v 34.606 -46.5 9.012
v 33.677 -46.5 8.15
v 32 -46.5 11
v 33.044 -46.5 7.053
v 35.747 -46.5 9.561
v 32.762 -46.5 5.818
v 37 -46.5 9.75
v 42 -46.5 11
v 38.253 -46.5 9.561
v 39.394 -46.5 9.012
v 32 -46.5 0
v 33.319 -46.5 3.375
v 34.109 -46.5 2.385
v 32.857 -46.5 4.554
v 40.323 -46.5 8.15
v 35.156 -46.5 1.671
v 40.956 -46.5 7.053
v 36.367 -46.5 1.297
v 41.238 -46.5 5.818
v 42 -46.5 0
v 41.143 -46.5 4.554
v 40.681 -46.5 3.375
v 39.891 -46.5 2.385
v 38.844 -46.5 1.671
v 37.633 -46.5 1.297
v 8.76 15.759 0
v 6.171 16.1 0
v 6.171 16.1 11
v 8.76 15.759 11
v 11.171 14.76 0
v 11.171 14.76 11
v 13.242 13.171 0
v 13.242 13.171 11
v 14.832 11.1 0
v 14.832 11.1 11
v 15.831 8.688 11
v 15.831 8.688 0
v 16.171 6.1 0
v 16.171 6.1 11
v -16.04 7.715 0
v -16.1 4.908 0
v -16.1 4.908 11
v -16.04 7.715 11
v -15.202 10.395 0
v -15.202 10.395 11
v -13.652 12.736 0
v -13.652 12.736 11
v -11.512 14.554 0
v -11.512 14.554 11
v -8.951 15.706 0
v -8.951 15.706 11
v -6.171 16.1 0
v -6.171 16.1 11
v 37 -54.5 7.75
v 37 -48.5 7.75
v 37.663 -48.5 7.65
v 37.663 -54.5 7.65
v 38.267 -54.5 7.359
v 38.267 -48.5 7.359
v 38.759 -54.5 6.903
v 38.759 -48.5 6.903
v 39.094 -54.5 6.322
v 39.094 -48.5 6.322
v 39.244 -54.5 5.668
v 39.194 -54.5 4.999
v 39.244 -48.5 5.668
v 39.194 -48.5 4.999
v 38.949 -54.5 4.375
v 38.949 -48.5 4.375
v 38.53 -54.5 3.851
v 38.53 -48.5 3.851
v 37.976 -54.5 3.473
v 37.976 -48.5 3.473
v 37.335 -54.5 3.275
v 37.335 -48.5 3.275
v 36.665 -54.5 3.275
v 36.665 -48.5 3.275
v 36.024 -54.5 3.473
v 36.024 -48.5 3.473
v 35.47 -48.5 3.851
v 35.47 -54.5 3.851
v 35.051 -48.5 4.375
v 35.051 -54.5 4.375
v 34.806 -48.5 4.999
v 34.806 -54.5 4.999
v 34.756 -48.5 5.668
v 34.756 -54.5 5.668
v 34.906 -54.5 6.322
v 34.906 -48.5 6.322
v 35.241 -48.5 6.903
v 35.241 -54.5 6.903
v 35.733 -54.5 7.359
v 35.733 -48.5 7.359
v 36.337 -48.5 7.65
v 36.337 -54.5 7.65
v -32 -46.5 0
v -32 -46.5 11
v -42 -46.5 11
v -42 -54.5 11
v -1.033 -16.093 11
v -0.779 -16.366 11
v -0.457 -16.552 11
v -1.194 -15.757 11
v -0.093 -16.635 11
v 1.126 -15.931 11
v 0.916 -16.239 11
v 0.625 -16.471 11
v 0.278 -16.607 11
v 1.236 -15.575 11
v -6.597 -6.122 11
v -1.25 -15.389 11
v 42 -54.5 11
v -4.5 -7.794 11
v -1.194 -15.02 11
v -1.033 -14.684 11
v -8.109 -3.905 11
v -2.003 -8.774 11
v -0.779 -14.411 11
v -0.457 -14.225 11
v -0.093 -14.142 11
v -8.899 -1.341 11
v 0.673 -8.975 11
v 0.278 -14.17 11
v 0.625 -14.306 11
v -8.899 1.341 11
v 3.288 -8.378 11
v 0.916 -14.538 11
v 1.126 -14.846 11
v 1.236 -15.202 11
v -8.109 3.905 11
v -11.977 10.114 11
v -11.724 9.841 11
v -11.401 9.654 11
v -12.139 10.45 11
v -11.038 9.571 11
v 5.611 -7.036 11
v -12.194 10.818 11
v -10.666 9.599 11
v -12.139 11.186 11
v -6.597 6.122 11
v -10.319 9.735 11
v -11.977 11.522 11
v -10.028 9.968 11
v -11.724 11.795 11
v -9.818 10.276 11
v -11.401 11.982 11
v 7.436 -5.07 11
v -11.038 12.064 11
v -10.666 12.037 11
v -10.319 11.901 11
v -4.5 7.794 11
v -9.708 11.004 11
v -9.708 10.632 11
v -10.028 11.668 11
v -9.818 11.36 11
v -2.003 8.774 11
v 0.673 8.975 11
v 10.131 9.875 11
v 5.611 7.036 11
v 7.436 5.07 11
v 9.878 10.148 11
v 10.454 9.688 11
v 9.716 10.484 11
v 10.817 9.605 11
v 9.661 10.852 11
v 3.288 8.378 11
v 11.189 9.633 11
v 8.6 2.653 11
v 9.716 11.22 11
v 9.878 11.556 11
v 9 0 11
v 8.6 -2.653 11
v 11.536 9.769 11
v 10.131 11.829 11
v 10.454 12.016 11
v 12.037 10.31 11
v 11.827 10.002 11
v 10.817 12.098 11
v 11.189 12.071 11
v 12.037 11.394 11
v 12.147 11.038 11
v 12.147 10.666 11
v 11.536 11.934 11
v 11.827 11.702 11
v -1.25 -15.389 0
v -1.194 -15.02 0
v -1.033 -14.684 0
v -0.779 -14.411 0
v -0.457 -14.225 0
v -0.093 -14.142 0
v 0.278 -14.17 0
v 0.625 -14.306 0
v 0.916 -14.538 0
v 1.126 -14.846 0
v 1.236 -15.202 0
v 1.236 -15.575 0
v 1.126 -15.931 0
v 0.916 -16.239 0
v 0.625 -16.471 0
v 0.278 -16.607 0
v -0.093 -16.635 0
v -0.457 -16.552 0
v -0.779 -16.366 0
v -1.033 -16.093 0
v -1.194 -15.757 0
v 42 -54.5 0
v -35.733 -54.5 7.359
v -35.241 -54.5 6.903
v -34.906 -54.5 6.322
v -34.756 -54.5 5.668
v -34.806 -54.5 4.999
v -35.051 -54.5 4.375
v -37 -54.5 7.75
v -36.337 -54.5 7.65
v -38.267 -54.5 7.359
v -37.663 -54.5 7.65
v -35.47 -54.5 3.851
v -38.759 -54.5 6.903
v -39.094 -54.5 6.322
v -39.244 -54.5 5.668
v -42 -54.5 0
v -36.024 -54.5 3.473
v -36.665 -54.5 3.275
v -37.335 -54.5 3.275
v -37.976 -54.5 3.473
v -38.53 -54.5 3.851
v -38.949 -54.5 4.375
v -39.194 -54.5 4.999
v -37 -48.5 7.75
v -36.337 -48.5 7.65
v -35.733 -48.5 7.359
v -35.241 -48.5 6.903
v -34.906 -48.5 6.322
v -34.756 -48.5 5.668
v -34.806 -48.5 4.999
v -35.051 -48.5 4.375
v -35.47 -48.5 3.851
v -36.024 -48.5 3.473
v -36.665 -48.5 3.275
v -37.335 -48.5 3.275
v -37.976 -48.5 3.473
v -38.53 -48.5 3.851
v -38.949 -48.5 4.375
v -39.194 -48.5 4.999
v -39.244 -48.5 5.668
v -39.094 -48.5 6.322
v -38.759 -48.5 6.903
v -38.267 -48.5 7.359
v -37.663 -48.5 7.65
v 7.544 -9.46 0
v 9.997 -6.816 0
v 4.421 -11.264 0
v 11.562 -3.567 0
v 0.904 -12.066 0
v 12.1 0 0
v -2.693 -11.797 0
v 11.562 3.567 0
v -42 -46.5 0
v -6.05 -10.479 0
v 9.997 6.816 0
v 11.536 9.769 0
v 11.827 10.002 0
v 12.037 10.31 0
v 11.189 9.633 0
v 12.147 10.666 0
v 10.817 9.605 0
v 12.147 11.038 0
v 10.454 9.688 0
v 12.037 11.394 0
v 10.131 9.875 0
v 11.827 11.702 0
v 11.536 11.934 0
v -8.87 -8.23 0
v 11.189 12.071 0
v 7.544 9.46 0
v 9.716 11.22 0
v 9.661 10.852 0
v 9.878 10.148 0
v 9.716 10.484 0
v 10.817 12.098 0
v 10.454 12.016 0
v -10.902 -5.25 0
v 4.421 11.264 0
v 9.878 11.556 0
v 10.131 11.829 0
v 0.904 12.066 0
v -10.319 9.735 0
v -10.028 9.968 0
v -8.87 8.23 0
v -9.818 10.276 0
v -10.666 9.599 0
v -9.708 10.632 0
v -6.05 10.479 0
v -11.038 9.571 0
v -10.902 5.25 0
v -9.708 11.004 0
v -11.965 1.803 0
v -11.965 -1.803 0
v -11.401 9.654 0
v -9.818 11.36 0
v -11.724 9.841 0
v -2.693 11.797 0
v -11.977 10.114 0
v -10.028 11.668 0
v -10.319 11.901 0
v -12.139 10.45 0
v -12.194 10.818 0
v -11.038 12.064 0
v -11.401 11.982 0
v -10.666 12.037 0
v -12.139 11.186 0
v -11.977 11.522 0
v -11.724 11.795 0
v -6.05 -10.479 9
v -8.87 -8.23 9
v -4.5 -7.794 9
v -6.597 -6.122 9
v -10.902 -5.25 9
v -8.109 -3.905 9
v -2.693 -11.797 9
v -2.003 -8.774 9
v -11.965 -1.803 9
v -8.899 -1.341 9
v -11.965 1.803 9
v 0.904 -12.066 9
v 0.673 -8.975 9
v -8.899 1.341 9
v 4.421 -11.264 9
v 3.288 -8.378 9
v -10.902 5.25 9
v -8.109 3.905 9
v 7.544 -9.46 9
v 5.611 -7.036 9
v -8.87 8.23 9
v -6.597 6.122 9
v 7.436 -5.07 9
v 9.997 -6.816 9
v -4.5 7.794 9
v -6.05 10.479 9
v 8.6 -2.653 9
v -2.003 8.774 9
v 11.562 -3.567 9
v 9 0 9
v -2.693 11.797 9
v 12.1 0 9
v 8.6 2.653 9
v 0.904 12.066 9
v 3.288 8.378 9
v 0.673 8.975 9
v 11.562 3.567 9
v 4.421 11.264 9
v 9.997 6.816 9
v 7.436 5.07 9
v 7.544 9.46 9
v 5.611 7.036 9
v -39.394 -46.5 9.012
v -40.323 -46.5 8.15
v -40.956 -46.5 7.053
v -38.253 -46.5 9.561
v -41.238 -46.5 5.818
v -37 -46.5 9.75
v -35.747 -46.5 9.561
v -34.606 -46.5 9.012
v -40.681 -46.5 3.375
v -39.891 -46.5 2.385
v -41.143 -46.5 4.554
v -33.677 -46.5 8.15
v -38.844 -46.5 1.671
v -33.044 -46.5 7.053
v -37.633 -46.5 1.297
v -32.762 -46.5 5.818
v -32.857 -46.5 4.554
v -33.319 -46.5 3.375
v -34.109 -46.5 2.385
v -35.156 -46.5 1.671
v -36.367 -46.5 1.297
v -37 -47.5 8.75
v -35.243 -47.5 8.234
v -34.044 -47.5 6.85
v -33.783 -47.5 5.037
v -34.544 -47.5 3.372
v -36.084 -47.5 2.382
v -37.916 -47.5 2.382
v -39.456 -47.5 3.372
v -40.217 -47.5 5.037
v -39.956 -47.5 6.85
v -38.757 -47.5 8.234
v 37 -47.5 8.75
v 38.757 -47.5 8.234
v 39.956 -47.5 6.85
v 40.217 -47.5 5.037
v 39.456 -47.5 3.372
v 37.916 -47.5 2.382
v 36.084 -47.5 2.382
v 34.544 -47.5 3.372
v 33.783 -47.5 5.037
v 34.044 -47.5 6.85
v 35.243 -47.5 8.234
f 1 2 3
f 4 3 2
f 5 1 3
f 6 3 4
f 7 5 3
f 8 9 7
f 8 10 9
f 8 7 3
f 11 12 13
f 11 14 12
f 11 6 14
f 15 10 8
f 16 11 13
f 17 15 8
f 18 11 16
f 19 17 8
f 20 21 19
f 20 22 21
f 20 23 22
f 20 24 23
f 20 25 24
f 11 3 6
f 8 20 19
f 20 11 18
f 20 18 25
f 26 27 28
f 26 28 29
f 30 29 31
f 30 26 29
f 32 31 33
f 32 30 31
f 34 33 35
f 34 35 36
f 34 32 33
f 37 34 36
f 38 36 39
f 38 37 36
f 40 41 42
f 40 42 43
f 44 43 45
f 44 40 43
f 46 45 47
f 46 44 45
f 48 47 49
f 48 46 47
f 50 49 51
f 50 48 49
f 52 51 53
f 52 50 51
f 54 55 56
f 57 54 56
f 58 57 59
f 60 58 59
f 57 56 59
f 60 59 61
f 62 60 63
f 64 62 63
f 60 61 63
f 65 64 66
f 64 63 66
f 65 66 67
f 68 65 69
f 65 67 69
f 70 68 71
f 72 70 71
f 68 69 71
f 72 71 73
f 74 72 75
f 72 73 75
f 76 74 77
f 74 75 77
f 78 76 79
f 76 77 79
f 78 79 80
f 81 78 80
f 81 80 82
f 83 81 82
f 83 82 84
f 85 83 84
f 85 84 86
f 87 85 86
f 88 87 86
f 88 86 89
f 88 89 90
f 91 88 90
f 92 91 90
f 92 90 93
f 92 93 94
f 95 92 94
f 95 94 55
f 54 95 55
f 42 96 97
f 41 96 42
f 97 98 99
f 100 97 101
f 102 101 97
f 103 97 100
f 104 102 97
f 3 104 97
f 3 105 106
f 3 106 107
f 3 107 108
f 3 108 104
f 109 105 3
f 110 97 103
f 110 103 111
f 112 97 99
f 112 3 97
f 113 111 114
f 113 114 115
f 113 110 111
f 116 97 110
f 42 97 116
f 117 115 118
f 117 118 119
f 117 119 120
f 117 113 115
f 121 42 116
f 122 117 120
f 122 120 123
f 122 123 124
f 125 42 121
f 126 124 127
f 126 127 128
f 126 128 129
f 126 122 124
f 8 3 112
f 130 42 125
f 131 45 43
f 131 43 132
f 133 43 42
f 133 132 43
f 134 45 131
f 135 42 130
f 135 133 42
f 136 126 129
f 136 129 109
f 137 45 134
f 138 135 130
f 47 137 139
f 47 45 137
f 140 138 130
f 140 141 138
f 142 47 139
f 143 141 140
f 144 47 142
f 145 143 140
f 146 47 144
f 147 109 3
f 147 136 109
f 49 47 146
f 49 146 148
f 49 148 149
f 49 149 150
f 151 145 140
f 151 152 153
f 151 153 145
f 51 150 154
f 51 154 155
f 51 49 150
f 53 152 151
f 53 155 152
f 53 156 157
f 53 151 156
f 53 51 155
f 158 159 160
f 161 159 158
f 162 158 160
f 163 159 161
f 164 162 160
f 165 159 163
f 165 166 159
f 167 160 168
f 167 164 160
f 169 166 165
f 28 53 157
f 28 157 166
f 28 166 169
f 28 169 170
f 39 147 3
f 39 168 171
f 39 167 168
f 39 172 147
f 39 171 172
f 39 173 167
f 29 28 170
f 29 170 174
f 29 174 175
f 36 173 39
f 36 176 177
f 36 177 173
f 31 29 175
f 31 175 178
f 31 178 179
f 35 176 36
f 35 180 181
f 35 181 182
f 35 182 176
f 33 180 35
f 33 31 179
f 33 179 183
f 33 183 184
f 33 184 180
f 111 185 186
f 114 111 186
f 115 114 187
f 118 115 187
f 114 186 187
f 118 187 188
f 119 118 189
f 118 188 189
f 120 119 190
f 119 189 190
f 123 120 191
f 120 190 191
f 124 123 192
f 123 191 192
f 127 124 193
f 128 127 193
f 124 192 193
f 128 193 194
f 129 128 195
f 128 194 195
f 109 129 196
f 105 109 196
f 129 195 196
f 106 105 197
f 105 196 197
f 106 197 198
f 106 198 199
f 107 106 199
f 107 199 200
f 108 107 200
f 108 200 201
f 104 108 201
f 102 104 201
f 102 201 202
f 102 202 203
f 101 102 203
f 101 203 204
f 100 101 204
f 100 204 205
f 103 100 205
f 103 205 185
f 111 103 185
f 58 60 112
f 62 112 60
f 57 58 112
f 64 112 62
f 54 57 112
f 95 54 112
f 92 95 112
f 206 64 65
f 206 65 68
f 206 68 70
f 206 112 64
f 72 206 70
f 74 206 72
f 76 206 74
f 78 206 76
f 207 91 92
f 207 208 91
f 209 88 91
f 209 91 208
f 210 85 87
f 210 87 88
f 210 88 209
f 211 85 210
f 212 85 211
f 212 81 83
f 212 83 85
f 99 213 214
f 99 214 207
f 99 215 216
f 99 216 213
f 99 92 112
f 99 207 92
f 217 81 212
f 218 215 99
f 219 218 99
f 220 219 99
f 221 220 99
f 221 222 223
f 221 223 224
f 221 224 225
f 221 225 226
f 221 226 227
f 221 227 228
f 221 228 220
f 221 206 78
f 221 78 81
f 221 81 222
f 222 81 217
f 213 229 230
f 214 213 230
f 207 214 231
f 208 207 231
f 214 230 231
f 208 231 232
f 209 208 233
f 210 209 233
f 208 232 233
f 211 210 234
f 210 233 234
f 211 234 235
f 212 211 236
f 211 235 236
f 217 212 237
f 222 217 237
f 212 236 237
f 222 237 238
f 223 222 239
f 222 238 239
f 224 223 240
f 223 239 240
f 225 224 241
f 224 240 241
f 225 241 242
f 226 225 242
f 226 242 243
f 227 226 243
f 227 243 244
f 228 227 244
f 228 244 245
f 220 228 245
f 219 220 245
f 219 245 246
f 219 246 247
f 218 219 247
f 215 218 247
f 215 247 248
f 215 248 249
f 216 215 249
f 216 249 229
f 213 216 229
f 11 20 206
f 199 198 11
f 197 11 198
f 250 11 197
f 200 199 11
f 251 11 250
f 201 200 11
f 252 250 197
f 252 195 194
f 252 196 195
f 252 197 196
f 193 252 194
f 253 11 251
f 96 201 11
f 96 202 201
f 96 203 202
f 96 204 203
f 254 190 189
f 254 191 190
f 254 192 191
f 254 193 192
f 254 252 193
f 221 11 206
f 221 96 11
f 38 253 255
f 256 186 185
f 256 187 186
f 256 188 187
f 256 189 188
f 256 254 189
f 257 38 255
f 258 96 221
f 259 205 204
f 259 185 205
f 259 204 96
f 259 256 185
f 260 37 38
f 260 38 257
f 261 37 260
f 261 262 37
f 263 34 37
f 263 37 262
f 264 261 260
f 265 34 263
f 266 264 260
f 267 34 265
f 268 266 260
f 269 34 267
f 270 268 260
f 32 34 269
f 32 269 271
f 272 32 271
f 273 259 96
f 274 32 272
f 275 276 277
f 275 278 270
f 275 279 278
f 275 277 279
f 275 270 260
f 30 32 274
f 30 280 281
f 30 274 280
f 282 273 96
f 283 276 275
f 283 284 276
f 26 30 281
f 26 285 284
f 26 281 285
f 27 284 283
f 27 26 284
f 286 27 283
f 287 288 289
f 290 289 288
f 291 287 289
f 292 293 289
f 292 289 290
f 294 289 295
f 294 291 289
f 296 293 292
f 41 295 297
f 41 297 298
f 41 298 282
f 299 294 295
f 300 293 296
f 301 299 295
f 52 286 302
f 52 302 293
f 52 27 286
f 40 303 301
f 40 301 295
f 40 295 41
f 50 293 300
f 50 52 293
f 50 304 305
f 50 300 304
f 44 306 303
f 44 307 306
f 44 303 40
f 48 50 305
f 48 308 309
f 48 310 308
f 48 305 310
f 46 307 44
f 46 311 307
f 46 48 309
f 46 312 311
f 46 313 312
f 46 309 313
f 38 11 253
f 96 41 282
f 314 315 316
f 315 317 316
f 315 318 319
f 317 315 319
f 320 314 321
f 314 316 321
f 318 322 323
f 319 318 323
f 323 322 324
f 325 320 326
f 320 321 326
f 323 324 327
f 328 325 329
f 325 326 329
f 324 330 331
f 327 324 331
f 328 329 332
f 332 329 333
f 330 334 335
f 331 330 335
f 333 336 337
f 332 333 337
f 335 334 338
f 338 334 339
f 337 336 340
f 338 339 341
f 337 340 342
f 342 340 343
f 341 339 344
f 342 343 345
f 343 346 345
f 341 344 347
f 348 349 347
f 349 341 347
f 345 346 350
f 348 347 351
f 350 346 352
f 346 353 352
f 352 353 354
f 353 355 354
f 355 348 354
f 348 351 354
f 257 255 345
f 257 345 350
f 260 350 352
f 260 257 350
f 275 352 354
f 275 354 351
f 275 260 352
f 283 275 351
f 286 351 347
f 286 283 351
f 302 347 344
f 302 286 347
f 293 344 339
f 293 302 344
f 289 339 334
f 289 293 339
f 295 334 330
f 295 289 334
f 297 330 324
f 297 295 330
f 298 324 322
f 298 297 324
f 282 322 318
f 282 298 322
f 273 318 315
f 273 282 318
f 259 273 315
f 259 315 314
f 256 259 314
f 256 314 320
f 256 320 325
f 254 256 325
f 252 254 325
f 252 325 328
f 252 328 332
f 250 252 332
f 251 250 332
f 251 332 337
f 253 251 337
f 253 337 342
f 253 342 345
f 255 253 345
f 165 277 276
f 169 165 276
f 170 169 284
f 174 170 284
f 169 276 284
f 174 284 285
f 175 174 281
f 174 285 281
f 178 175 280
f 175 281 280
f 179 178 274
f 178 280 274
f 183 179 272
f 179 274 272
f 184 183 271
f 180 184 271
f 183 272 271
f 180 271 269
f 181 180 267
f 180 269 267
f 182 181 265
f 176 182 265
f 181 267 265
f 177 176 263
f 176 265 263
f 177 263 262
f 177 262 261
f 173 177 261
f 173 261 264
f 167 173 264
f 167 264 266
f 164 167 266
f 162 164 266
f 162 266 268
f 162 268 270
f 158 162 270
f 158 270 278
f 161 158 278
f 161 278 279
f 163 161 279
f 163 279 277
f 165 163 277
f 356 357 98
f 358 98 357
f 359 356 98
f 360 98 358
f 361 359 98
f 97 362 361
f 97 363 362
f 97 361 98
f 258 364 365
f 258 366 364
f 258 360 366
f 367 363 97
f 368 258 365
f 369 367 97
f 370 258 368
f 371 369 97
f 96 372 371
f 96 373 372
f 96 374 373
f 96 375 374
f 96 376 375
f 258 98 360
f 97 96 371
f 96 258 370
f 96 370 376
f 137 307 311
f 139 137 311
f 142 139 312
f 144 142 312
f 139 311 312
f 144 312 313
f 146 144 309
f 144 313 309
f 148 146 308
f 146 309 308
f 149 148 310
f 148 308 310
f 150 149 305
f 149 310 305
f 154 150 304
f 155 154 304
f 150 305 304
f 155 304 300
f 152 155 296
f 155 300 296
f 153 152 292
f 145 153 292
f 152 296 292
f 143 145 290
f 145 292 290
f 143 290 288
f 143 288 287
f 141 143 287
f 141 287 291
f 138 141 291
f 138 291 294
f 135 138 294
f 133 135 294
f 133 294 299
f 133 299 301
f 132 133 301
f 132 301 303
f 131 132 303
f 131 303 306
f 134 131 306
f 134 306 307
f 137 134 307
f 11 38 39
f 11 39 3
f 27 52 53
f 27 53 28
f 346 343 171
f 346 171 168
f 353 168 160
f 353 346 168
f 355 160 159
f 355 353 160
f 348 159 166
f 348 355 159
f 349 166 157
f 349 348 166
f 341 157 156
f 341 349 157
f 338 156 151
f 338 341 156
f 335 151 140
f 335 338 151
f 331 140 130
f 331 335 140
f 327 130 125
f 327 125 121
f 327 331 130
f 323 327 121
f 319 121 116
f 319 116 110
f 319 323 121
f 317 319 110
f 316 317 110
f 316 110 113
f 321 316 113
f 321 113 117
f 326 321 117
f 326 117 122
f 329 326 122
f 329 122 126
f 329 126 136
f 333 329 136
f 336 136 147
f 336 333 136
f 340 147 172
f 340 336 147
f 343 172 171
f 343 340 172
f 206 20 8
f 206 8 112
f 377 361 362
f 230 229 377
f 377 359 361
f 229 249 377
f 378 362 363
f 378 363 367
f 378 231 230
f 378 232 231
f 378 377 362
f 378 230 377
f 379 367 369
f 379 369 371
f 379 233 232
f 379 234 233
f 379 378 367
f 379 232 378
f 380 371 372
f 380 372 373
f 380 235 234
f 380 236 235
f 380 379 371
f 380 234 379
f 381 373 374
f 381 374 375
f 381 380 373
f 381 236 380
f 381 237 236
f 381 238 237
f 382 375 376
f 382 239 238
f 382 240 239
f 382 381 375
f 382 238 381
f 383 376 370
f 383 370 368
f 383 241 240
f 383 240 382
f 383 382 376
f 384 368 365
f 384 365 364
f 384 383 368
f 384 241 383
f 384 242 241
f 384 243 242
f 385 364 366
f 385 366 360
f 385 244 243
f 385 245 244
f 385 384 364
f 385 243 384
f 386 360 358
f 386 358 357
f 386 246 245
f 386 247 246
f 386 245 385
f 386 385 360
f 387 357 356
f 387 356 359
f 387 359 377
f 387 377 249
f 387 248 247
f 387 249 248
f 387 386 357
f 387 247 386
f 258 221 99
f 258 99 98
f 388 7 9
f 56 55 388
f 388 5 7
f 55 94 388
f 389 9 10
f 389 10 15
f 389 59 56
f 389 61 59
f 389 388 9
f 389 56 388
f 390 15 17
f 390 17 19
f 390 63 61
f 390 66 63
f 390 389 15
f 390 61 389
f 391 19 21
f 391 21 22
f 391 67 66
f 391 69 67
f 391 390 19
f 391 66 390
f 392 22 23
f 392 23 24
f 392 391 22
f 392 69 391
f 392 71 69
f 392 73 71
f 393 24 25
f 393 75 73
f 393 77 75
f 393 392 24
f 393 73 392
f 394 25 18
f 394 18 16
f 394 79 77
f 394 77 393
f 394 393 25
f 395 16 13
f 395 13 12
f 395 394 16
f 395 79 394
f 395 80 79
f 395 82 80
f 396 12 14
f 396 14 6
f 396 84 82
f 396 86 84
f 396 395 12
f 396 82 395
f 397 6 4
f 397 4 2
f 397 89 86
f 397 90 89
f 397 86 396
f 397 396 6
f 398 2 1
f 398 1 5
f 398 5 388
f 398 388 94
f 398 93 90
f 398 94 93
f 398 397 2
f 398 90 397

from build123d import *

# Parameters (mm, degrees)
SCHIZZO1_R                   = 12.1
ESTRUSIONE_ESTRUSIONE1_DEPTH = 11
ESTRUSIONE_ESTRUSIONE2_START = -2
SCHIZZO2_R                   = 12.1
SCHIZZO2_R_2                 = 9
ESTRUSIONE_ESTRUSIONE2_DEPTH = 2
SCHIZZO3_R                   = 2.25
TAGLIO_ESTRUSIONE1_DEPTH     = 77.182412669
SMUSSO1_SIZE                 = 2
SCHIZZO4_R                   = 1.25
TAGLIO_ESTRUSIONE2_DEPTH     = 70.679623994


with BuildPart() as part:
    # Schizzo1 → Estrusione-Estrusione1 (new body)
    with BuildSketch(Plane.XY):
        with BuildLine():
            Line((-6.171311325, 16.1), (6.171311325, 16.1))
            ThreePointArc((6.171311325, 16.1), (13.242379137, 13.171067812), (16.171311325, 6.1))
            Line((16.171311325, 6.1), (32, -46.5))
            Line((32, -46.5), (42, -46.5))
            Line((42, -46.5), (42, -54.5))
            Line((42, -54.5), (17, -54.5))
            Line((17, -54.5), (-17, -54.5))
            Line((-17, -54.5), (-42, -54.5))
            Line((-42, -54.5), (-42, -46.5))
            Line((-42, -46.5), (-32, -46.5))
            Line((-32, -46.5), (-16.1, 4.907883736))
            ThreePointArc((-16.1, 4.907883736), (-13.651991863, 12.73622021), (-6.171311325, 16.1))
        make_face()
        Circle(SCHIZZO1_R, mode=Mode.SUBTRACT)
    extrude(amount=ESTRUSIONE_ESTRUSIONE1_DEPTH)

    # Schizzo2 → Estrusione-Estrusione2 (add)
    with BuildSketch(Plane.XY.offset(11).offset(ESTRUSIONE_ESTRUSIONE2_START)):
        Circle(SCHIZZO2_R)
        Circle(SCHIZZO2_R_2, mode=Mode.SUBTRACT)
    extrude(amount=ESTRUSIONE_ESTRUSIONE2_DEPTH)

    # Schizzo3 → Taglio-Estrusione1 (cut, through all)
    with BuildSketch(Plane(origin=(0, -46.5, 0), x_dir=(1, 0, 0), z_dir=(0, 1, 0))):
        with Locations(Location((37, -5.5, 0), (0, 0, 270))):
            Circle(SCHIZZO3_R)
        with Locations(Location((-37, -5.5, 0), (0, 0, 270))):
            Circle(SCHIZZO3_R)
    extrude(amount=-TAGLIO_ESTRUSIONE1_DEPTH, mode=Mode.SUBTRACT)

    # Smusso1
    smusso1_edges = [part.edges().sort_by_distance(p)[0] for p in [
        (37, -46.5, 3.25),
        (-37, -46.5, 3.25),
    ]]
    chamfer(smusso1_edges, length=SMUSSO1_SIZE)

    # Schizzo4 → Taglio-Estrusione2 (cut, through all)
    with BuildSketch(Plane(origin=(0, 0, 0), x_dir=(-1, 0, 0), z_dir=(0, 0, -1))):
        with Locations((-10.910719744, 10.851964601)):
            Circle(SCHIZZO4_R)
        with Locations((10.944459062, 10.817992606)):
            Circle(SCHIZZO4_R)
        with Locations((0, -15.38859776)):
            Circle(SCHIZZO4_R)
    extrude(amount=-TAGLIO_ESTRUSIONE2_DEPTH, mode=Mode.SUBTRACT)


solid = part.part
